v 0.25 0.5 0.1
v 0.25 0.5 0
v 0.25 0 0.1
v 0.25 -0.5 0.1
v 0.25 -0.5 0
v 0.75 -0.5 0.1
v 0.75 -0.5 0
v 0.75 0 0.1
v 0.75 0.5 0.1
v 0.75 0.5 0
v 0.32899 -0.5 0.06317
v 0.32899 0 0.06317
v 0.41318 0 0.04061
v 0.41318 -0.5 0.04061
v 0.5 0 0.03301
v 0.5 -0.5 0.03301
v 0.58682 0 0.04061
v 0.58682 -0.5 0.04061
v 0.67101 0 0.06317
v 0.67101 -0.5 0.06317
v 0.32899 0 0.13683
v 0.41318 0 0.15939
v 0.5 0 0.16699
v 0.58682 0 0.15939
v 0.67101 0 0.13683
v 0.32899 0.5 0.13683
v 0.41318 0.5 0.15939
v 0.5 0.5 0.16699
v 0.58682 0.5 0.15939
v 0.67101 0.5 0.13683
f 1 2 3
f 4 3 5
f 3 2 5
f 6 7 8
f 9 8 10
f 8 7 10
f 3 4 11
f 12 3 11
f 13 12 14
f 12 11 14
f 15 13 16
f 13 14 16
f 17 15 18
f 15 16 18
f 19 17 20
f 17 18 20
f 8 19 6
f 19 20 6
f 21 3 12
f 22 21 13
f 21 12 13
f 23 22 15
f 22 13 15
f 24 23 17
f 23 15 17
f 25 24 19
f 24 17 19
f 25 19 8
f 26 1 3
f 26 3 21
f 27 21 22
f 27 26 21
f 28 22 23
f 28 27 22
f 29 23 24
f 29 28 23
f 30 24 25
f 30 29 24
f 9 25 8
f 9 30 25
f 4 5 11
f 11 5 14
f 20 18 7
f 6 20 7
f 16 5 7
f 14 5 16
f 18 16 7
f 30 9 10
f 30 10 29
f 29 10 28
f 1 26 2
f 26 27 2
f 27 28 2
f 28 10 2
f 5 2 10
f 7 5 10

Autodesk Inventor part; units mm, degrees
ref_plane "YZ Plane" through (0, 0, 0) normal (1, 0, 0) x (0, 1, 0)
ref_plane "XZ Plane" through (0, 0, 0) normal (0, 1, 0) x (-1, 0, 0)
ref_plane "XY Plane" through (0, 0, 0) normal (0, 0, 1) x (1, 0, 0)
sketch "스케치1" plane through (0, 0, 0) normal (0, 0, 1) x (1, 0, 0)
  line L0 (-0.15, 0) -> (0.9, 0) construction
  line L1 (0, -0.7) -> (0, 0.7) construction
  line L2 (0.25, -0.5) -> (0.75, -0.5)
  line L3 (0.75, -0.5) -> (0.75, 0.5)
  line L4 (0.75, 0.5) -> (0.25, 0.5)
  line L5 (0.25, 0.5) -> (0.25, -0.5)
  point P0 (0, 0)
  point P1 (0.5, -0.5)
  dimension "d7" = 0.5
  dimension "d8" = 1
  dimension "d9" = 0.25
extrude "돌출1" add sketch "스케치1" along normal blind 0.1
sketch "스케치3" plane through (0.25, 0.5, 0) normal (0, 1, 0) x (1, 0, 0)
  line L0 (-0.25, 0.6093) -> (-0.25, -0.2964) construction
  line L1 (-0.4, 0) -> (0.65, 0) construction
  line L2 (0.5, 0) -> (0, 0) projected
  line L3 (0, 0) -> (0, -0.1) projected
  line L4 (0.5, -0.1) -> (0, -0.1) projected
  line L5 (0.5, 0) -> (0.5, -0.1) projected
  arc A0 (0, -0.1) -> (0.5, -0.1) centre (0.25, 0.333) ccw
  line L6 (0.25, -0.1) -> (0.25, 0.4799) construction
  point P0 (-0.25, 0)
  dimension "d10" = 0.5
extrude "돌출3" add sketch "스케치3" against normal blind 0.5 contours A0 L4
sketch "스케치4" plane through (0.25, -0.5, 0) normal (0, -1, 0) x (1, 0, 0)
  line L0 (0, 0) -> (0.5, 0) projected
  line L1 (0.5, 0) -> (0.5, 0.1) projected
  line L2 (0, 0.1) -> (0.5, 0.1) projected
  line L3 (0, 0) -> (0, 0.1) projected
  arc A0 (0, 0.1) -> (0.5, 0.1) centre (0.25, 0.533) ccw
  point P0 (-0.25, 0)
  dimension "d15" = 0.5
extrude "돌출4" cut sketch "스케치4" against normal blind 0.5 contours L2 A0
properties part number "flat_surface_1"
